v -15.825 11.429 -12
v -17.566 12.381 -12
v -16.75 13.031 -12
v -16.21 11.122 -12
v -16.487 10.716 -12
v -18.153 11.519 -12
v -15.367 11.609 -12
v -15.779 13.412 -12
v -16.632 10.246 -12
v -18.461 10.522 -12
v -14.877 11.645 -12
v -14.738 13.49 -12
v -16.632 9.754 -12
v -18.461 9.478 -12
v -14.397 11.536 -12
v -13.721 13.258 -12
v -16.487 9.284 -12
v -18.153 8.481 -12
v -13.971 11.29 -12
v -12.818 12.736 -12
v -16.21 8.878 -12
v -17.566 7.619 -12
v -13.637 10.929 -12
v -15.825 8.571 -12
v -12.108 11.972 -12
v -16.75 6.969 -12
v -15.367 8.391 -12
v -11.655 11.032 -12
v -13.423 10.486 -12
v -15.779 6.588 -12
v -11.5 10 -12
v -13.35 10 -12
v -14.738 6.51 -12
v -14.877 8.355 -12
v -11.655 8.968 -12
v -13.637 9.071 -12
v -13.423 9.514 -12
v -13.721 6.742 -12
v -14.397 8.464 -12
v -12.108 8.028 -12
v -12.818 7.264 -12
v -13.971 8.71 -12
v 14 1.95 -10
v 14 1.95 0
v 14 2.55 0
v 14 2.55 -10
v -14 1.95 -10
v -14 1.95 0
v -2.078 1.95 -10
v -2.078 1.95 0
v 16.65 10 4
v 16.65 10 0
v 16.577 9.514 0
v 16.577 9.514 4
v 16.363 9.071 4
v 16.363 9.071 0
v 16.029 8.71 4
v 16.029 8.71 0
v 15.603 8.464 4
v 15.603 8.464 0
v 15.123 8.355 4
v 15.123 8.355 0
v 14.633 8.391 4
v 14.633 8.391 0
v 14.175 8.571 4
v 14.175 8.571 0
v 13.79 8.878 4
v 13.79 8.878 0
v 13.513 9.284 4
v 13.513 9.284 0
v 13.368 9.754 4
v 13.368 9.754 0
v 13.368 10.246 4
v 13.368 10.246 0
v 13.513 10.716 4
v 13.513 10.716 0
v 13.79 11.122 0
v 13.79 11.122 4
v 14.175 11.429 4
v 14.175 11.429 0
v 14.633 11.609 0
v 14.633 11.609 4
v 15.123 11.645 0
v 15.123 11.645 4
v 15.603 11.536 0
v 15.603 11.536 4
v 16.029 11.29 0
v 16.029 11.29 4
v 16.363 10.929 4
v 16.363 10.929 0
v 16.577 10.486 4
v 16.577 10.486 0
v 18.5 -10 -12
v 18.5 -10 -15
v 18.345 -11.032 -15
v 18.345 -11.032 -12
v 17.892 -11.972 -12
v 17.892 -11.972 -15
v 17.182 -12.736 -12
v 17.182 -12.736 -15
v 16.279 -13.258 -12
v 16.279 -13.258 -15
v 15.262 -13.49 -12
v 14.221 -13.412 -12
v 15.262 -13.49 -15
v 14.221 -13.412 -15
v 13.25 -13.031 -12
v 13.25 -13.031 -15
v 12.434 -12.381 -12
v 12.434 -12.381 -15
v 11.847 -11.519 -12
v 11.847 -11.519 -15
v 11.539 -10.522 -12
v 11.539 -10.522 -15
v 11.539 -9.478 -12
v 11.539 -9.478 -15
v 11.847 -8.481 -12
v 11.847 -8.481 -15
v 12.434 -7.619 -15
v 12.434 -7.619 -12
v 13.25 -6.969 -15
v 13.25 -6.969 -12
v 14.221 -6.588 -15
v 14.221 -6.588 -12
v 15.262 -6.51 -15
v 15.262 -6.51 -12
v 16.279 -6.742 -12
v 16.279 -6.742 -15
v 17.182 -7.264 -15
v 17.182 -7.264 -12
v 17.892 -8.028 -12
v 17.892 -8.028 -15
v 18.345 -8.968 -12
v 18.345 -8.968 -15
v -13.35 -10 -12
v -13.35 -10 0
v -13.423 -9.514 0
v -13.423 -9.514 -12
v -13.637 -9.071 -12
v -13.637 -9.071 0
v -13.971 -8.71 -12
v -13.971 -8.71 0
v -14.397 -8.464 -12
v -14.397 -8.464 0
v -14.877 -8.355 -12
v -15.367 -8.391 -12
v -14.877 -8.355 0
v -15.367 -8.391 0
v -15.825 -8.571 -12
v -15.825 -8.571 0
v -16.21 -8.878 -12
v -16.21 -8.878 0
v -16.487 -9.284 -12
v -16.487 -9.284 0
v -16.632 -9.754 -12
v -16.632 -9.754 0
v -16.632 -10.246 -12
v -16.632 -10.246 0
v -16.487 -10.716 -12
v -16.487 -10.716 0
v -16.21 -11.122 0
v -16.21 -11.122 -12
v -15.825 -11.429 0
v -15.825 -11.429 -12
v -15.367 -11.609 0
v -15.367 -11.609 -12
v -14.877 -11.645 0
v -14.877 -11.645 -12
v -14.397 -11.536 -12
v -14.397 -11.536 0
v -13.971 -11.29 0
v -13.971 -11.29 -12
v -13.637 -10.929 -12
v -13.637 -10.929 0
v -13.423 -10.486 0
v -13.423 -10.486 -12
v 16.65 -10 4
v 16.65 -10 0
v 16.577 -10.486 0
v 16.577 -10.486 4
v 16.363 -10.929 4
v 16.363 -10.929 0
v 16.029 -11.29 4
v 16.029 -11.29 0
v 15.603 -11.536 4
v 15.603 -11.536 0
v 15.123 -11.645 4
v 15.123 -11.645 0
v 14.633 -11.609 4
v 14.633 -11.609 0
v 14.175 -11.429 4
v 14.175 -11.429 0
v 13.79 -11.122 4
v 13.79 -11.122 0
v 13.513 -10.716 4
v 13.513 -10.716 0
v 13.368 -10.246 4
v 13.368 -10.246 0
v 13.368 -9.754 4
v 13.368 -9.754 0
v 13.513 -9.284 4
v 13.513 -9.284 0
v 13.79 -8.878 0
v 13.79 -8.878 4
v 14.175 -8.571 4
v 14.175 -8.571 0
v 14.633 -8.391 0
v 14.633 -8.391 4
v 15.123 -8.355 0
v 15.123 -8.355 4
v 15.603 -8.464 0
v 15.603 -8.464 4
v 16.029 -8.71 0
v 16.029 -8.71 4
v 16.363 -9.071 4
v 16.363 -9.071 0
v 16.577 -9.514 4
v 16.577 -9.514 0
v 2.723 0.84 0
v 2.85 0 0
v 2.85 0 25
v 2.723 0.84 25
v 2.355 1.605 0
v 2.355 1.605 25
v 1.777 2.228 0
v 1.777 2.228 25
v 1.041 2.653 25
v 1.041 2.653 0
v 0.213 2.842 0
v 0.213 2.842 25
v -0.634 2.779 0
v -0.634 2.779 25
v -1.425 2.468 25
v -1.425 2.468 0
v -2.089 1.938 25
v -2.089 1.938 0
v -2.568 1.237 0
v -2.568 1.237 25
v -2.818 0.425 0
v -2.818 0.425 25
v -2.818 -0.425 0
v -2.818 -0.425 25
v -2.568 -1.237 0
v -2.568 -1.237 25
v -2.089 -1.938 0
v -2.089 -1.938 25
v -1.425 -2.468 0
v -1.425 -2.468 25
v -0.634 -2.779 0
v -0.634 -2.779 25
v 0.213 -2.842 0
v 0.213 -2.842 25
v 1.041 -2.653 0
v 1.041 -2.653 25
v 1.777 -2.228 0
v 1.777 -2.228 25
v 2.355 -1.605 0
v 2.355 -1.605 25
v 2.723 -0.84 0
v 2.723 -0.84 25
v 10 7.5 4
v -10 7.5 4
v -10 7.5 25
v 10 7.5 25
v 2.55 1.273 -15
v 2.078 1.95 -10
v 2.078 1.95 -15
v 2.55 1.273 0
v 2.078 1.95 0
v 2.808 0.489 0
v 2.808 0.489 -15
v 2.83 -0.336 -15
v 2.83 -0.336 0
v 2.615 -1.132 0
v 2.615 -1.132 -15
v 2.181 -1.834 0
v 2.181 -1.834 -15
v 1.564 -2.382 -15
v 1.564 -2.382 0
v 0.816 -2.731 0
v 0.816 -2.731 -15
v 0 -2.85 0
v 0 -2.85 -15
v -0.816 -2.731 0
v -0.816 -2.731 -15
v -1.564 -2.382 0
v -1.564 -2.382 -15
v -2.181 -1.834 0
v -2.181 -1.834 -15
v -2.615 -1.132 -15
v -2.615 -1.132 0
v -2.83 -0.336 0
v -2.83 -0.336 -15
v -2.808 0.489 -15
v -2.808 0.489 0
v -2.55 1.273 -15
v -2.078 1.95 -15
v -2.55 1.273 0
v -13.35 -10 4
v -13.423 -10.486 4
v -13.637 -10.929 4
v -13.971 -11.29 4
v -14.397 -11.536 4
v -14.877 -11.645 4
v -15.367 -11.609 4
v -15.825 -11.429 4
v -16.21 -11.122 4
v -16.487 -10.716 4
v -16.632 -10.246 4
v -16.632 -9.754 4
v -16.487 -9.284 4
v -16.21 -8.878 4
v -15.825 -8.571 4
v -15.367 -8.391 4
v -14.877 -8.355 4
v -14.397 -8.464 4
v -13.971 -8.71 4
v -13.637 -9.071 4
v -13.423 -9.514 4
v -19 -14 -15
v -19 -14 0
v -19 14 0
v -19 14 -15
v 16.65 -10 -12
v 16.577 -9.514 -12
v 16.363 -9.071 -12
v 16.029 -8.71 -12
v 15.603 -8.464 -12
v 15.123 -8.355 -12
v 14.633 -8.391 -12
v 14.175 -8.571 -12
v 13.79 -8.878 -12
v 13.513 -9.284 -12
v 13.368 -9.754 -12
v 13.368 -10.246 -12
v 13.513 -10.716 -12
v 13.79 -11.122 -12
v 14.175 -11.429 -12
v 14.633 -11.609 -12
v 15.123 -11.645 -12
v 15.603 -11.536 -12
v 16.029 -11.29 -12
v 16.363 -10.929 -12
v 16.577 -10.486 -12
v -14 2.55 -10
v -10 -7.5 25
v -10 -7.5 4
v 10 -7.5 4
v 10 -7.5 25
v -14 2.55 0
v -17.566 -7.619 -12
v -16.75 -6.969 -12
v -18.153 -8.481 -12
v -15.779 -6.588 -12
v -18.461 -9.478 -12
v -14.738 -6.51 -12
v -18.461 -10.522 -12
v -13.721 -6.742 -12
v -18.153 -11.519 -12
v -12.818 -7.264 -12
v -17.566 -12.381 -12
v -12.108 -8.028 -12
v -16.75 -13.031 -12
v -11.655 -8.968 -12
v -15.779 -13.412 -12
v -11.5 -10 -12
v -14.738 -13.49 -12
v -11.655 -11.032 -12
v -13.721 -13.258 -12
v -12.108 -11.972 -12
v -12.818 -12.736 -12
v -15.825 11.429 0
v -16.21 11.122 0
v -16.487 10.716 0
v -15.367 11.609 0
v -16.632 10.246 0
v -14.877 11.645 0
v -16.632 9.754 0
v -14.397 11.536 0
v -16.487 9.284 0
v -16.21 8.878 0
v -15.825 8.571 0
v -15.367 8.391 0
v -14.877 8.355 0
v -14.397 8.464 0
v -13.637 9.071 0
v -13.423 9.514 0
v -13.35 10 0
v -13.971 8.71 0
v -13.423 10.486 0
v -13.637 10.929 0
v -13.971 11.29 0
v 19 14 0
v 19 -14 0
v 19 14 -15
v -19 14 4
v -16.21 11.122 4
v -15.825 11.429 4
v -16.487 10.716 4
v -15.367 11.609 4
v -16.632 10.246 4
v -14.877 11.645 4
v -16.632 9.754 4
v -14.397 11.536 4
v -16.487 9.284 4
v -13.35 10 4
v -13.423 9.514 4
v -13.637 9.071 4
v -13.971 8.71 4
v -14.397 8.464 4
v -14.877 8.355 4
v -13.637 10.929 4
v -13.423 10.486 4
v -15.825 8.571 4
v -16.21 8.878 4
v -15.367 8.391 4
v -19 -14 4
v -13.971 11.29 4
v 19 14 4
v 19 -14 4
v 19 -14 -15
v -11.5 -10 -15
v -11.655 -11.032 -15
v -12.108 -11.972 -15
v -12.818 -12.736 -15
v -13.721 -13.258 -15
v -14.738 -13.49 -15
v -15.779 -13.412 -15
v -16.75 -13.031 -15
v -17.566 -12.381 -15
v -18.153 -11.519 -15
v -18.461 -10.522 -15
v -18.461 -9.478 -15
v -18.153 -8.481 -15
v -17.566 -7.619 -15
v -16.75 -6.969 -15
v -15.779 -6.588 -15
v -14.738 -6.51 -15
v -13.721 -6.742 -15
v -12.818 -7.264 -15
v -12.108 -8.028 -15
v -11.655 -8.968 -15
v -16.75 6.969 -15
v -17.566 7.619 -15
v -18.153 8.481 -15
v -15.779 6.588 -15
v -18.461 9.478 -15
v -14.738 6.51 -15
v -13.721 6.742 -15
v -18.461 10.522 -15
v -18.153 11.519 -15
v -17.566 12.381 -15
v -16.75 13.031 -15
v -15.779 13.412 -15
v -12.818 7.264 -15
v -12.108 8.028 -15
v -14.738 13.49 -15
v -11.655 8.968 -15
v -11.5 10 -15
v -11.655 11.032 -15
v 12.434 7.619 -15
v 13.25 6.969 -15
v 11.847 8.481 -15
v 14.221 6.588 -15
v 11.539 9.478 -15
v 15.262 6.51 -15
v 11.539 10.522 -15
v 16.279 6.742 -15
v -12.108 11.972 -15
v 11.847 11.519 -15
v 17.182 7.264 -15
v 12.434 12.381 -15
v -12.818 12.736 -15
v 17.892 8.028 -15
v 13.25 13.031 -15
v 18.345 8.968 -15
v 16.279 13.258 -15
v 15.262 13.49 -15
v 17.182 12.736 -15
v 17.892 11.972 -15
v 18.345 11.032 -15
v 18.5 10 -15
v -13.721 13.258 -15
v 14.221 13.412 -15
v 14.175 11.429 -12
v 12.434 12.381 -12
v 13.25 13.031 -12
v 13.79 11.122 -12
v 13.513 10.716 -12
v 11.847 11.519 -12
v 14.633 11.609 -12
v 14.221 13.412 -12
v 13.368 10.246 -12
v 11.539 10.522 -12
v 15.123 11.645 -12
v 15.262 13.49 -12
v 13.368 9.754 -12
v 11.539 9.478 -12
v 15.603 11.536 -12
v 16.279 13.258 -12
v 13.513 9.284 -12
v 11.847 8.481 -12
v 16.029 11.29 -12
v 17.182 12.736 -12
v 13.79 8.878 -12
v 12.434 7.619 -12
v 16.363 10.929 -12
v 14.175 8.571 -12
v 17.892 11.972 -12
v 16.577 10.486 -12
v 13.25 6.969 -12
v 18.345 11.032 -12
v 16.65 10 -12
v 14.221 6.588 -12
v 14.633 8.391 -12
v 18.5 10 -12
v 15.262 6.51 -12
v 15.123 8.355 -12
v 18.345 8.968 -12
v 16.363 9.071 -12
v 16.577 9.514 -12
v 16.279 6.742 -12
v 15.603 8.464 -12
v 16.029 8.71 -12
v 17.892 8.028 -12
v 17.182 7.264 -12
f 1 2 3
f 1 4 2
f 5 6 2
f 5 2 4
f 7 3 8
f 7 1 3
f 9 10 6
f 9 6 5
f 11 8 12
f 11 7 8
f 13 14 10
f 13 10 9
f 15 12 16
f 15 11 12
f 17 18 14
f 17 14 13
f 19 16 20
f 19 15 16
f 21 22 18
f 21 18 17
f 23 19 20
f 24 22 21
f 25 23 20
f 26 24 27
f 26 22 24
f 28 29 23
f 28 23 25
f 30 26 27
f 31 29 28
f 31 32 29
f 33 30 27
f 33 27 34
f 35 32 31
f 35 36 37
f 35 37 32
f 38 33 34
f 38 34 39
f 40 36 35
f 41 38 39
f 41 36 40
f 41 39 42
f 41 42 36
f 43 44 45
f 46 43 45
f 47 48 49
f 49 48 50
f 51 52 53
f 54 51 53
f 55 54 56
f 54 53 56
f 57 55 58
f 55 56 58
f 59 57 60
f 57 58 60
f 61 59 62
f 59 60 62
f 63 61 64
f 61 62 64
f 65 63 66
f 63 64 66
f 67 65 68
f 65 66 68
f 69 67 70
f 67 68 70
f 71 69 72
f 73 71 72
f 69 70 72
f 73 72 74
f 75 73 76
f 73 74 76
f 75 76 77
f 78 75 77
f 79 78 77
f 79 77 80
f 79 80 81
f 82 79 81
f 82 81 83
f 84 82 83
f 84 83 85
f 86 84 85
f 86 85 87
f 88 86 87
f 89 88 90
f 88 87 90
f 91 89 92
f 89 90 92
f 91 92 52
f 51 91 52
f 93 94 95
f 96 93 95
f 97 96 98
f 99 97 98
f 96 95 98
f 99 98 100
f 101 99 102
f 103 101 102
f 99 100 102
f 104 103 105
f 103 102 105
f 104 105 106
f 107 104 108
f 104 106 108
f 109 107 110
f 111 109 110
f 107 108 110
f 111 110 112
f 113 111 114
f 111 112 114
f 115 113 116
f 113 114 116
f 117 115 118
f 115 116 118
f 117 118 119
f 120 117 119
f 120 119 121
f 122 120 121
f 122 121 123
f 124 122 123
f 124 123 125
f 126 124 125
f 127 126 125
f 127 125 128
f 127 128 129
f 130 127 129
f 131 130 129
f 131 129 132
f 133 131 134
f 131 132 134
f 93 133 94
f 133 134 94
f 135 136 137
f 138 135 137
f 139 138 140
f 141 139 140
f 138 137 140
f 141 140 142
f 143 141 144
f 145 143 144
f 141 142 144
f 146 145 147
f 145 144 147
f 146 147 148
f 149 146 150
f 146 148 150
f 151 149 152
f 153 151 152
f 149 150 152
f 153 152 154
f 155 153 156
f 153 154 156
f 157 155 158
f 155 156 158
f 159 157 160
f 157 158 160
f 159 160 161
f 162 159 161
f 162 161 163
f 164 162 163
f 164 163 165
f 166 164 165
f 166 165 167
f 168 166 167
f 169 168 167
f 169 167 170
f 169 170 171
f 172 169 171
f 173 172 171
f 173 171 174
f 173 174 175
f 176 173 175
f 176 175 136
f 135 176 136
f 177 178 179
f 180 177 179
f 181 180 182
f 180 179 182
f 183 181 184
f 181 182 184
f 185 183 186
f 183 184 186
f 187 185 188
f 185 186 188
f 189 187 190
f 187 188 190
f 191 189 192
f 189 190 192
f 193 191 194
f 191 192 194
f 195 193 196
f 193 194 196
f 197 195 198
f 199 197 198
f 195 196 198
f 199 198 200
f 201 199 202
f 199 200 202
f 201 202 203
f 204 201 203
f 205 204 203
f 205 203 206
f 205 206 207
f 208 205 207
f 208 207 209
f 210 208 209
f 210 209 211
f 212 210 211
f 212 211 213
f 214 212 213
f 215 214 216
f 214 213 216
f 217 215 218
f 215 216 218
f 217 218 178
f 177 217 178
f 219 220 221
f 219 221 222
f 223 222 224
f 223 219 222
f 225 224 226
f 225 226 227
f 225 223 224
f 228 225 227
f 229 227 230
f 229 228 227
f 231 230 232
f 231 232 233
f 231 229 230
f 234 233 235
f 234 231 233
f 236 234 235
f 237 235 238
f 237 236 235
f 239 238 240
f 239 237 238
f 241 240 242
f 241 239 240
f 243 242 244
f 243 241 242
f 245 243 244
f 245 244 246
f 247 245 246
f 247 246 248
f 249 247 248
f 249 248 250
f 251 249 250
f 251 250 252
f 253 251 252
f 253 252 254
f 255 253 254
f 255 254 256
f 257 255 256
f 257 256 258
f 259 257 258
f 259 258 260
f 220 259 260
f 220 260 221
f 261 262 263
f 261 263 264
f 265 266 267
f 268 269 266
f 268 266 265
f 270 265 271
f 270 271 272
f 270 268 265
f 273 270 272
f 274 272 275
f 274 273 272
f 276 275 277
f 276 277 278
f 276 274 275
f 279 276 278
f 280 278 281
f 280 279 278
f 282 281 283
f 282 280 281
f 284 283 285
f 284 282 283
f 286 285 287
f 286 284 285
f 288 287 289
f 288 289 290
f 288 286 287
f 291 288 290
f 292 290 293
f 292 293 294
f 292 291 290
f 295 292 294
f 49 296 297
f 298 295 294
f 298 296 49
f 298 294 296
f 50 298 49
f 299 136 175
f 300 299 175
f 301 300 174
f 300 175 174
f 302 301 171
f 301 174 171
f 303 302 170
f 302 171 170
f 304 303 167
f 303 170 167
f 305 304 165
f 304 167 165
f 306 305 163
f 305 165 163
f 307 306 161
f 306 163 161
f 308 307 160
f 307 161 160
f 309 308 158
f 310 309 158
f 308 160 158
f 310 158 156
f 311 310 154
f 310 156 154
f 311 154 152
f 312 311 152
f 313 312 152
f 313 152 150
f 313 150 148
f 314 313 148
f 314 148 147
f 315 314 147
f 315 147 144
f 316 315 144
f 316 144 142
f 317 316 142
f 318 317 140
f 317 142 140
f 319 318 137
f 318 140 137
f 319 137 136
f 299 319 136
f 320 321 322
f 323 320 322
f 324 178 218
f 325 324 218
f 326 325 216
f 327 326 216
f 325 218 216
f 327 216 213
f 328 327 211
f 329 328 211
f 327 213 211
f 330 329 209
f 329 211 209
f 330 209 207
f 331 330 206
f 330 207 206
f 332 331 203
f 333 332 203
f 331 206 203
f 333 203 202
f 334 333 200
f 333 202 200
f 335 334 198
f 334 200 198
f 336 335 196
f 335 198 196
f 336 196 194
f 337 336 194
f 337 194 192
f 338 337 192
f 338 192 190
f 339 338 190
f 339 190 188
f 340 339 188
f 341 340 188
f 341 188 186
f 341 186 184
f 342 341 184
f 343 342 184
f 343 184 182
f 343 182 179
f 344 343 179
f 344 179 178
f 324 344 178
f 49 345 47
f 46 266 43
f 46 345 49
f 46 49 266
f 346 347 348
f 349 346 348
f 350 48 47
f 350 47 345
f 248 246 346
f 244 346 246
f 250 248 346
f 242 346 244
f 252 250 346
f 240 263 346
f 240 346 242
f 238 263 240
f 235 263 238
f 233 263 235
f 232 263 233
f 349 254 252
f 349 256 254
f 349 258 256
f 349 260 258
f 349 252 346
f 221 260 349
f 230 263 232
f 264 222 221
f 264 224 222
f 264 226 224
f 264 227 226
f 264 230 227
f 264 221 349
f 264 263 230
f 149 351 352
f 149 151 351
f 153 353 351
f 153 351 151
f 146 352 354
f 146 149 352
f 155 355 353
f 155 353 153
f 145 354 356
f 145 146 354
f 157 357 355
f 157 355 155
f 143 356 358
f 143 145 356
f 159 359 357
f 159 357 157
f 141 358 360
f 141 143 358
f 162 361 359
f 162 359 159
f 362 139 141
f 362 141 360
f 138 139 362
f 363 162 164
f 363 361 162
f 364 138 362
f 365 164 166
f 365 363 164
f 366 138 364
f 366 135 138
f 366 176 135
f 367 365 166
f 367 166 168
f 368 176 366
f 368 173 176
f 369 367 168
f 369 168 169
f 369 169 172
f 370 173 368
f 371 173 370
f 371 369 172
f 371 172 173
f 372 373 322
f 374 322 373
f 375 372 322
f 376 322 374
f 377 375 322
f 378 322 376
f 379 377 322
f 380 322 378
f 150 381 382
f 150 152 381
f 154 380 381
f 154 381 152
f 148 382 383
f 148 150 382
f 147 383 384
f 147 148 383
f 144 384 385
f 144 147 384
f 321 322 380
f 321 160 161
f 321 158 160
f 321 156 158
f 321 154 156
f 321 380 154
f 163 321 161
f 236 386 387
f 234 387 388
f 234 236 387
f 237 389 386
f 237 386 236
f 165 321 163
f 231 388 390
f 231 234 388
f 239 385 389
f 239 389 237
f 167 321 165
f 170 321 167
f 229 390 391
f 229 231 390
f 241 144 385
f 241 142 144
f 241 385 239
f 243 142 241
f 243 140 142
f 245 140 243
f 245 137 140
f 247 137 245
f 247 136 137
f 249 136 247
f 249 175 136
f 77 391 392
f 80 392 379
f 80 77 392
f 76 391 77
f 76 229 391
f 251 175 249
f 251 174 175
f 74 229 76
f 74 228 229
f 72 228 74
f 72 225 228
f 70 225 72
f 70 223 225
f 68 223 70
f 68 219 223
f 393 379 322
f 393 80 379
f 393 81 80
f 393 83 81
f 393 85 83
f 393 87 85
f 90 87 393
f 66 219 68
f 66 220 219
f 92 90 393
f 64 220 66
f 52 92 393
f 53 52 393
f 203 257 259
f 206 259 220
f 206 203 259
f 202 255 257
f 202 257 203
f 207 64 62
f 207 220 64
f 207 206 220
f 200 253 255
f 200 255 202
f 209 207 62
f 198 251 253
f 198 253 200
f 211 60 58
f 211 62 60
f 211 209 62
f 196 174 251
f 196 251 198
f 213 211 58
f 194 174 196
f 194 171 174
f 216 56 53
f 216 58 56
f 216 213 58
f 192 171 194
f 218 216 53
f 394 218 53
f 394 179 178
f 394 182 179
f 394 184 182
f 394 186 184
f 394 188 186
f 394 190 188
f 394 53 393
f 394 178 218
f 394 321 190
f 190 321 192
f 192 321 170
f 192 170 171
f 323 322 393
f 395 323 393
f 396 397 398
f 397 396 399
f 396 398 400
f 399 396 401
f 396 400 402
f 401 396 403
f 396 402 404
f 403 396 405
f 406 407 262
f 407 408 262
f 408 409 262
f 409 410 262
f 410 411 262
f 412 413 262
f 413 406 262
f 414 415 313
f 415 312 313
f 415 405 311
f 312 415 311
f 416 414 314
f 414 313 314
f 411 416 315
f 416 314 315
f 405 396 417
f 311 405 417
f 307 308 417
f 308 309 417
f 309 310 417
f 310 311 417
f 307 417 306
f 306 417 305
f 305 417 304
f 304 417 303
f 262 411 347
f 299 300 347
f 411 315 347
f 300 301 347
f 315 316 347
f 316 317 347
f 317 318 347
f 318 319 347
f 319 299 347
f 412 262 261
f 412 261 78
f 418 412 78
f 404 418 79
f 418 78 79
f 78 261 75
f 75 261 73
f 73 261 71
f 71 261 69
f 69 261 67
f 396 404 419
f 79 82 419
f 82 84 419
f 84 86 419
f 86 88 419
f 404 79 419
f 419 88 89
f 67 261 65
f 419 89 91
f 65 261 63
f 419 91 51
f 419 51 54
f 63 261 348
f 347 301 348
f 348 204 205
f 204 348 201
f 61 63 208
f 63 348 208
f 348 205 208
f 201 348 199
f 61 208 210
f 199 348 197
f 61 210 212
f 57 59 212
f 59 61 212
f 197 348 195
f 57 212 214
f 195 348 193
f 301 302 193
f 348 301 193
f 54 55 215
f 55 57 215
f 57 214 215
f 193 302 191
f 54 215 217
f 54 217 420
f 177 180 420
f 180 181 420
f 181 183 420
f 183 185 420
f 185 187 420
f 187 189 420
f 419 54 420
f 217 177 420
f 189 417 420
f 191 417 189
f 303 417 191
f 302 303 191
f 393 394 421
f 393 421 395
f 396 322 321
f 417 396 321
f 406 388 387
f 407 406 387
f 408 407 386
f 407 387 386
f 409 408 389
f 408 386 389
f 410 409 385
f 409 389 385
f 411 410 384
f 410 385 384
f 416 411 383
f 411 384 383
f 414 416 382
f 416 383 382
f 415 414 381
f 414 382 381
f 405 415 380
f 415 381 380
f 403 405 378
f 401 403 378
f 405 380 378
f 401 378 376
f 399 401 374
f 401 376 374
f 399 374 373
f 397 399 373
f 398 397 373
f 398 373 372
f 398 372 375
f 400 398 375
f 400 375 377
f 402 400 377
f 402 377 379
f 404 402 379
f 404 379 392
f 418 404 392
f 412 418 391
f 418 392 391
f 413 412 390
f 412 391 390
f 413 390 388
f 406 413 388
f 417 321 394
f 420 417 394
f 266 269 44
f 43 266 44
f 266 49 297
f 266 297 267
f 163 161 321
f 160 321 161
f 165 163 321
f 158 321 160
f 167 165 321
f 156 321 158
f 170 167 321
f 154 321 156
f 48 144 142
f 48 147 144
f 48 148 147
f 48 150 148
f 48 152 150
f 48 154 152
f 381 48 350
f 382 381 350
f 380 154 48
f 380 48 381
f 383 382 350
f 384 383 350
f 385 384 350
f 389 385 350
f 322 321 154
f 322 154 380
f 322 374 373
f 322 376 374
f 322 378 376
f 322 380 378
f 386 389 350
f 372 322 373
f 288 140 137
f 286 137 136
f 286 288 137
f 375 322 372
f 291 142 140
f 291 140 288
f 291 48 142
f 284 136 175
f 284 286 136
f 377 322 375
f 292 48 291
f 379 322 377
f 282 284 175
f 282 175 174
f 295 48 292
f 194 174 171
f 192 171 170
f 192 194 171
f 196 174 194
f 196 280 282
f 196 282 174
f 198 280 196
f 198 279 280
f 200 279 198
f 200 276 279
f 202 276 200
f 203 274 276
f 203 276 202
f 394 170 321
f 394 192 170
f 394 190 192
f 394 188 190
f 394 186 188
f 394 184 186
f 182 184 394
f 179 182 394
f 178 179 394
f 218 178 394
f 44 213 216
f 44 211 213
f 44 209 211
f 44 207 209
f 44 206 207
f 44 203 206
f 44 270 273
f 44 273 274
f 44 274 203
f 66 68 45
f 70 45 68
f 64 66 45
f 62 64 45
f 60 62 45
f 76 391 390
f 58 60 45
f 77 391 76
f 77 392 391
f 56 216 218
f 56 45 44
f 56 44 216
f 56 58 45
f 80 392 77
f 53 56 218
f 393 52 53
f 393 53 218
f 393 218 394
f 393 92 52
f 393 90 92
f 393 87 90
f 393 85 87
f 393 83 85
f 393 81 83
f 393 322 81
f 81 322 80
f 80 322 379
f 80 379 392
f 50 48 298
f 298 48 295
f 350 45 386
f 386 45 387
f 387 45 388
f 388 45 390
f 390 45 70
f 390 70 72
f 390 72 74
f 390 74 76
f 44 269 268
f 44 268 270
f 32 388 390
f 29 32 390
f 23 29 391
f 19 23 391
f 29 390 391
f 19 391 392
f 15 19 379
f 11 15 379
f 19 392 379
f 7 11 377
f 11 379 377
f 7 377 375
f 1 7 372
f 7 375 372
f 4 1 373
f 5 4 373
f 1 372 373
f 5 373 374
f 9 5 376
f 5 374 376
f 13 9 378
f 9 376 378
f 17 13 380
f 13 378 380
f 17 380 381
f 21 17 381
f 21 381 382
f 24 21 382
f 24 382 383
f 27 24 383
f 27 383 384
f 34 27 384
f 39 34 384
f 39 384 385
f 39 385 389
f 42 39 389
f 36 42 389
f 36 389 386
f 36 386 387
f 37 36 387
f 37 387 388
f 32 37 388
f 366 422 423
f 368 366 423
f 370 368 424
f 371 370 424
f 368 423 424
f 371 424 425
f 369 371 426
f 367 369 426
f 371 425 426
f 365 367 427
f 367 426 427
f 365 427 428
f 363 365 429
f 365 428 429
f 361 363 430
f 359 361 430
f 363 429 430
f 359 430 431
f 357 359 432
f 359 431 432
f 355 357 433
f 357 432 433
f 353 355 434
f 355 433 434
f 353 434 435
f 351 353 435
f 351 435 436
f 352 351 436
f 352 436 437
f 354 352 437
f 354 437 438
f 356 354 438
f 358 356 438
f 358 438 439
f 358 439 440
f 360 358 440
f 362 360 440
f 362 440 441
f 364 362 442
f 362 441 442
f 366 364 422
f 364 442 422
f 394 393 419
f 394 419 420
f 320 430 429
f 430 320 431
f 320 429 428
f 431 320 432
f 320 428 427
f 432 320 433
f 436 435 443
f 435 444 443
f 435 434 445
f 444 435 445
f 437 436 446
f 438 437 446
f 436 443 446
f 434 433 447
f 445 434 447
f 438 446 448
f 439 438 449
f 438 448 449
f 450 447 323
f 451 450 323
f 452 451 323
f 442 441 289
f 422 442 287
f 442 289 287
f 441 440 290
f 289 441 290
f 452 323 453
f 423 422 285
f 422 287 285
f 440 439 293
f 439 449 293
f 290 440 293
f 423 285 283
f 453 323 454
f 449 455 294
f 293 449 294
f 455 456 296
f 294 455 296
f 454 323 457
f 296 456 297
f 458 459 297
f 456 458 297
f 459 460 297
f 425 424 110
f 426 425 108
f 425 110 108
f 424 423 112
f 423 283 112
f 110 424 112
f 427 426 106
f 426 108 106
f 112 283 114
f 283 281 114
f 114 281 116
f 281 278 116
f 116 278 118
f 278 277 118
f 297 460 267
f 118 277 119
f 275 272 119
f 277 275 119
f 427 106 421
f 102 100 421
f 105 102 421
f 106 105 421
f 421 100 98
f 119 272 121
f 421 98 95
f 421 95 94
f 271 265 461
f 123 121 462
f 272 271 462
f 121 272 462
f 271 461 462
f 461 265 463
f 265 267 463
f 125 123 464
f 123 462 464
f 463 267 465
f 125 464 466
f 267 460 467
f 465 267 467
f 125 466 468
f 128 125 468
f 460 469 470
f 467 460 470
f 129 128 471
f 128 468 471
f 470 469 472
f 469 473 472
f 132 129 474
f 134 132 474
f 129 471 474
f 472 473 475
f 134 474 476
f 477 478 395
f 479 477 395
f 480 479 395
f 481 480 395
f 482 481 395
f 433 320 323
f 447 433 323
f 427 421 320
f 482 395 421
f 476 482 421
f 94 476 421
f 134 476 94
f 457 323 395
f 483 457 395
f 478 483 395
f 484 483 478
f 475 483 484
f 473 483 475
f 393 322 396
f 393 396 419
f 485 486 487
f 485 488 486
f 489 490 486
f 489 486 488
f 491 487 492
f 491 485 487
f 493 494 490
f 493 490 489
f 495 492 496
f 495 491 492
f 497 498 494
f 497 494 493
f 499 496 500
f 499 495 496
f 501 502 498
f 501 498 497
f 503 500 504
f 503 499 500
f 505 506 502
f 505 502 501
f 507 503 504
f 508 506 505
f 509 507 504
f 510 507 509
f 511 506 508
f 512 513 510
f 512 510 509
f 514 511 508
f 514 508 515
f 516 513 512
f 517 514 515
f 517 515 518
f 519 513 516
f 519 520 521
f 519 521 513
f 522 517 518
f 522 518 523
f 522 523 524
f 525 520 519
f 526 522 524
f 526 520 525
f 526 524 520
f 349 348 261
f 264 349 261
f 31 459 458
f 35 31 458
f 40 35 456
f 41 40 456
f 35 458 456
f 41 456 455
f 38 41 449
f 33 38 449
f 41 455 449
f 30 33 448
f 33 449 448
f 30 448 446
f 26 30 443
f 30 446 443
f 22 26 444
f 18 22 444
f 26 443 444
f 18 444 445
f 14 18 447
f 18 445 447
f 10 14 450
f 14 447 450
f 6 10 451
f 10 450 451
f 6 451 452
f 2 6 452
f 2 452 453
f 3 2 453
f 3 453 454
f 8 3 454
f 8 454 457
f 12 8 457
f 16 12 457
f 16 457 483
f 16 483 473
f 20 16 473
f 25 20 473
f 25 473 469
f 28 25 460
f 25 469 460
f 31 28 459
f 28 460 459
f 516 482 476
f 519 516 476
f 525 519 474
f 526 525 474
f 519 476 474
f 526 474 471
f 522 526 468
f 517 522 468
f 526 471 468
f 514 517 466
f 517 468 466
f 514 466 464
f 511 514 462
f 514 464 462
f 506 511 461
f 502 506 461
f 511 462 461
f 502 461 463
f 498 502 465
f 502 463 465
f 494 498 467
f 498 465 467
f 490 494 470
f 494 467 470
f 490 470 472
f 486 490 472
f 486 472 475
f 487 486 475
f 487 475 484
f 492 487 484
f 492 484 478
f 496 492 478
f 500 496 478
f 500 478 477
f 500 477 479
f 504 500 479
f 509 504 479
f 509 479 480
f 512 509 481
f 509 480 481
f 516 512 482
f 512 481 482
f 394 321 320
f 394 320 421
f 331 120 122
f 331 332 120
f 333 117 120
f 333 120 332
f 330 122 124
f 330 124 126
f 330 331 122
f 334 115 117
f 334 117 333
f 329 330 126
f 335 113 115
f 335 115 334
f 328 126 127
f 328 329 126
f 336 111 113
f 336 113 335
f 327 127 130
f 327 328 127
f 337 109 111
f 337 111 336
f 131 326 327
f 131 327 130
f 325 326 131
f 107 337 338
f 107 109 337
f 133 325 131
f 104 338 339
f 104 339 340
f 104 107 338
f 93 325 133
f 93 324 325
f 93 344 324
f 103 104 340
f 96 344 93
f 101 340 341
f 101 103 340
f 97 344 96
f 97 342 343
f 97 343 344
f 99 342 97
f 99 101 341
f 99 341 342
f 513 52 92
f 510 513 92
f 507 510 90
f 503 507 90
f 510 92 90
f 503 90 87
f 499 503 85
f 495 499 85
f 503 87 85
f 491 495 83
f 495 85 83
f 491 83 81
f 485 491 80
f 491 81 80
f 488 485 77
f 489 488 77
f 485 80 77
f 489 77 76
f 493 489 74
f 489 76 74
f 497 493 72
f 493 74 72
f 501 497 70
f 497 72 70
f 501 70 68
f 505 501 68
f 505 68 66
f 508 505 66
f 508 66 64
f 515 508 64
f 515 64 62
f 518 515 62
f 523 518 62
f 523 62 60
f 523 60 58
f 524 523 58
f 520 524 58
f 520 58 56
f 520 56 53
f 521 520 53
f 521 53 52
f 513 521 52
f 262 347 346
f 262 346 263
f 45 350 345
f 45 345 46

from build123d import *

# Parameters (mm, degrees)
F0_W     = 20
F0_H     = 15
F0_R     = 2.85
F1_DEPTH = 25
F2_W     = 38
F2_H     = 28
F2_R     = 1.65
F2_R_2   = 2.85
F3_DEPTH = 4
F4_W     = 38
F4_H     = 28
F4_R     = 1.65
F5_DEPTH = 15
F6_W     = 28
F6_H     = 0.6
F7_DEPTH = 10
F8_R     = 3.5
F9_DEPTH = 3


with BuildPart() as f1:
    # F0 (on Top) → F1 (new body)
    with BuildSketch(Plane.XY):
        Rectangle(F0_W, F0_H)
        Circle(F0_R, mode=Mode.SUBTRACT)
    extrude(amount=F1_DEPTH)

    # F2 (on face) → F3 (join)
    with BuildSketch(Plane(origin=(0, 0, 0), x_dir=(1, 0, 0), z_dir=(0, 0, -1))):
        Rectangle(F2_W, F2_H)
        with Locations((-15, -10)):
            Circle(F2_R, mode=Mode.SUBTRACT)
        with Locations((15, -10)):
            Circle(F2_R, mode=Mode.SUBTRACT)
        with Locations((-15, 10)):
            Circle(F2_R, mode=Mode.SUBTRACT)
        Circle(F2_R_2, mode=Mode.SUBTRACT)
        with Locations((15, 10)):
            Circle(F2_R, mode=Mode.SUBTRACT)
    extrude(amount=-F3_DEPTH)


with BuildPart() as f5:
    # F4 (on Top) → F5 (new body)
    with BuildSketch(Plane.XY):
        Rectangle(F4_W, F4_H)
        with Locations((-15, -10)):
            Circle(F4_R, mode=Mode.SUBTRACT)
        with Locations((15, -10)):
            Circle(F4_R, mode=Mode.SUBTRACT)
        with BuildLine():
            ThreePointArc((2.078461, 1.95), (0, -2.85), (-2.078461, 1.95))
            Line((-2.078461, 1.95), (2.078461, 1.95))
        make_face(mode=Mode.SUBTRACT)
        with Locations((-15, 10)):
            Circle(F4_R, mode=Mode.SUBTRACT)
        with Locations((15, 10)):
            Circle(F4_R, mode=Mode.SUBTRACT)
    extrude(amount=-F5_DEPTH)

    # F6 (on face) → F7 (cut)
    with BuildSketch(Plane.XY):
        with Locations((0, 2.25)):
            Rectangle(F6_W, F6_H)
    extrude(amount=-F7_DEPTH, mode=Mode.SUBTRACT)

    # F8 (on face) → F9 (cut)
    with BuildSketch(Plane(origin=(0, 0, -15), x_dir=(1, 0, 0), z_dir=(0, 0, -1))):
        with Locations((15, -10)):
            Circle(F8_R)
        with Locations((-15, -10)):
            Circle(F8_R)
        with Locations((-15, 10)):
            Circle(F8_R)
        with Locations((15, 10)):
            Circle(F8_R)
    extrude(amount=-F9_DEPTH, mode=Mode.SUBTRACT)


solid = Compound([f1.part, f5.part])
